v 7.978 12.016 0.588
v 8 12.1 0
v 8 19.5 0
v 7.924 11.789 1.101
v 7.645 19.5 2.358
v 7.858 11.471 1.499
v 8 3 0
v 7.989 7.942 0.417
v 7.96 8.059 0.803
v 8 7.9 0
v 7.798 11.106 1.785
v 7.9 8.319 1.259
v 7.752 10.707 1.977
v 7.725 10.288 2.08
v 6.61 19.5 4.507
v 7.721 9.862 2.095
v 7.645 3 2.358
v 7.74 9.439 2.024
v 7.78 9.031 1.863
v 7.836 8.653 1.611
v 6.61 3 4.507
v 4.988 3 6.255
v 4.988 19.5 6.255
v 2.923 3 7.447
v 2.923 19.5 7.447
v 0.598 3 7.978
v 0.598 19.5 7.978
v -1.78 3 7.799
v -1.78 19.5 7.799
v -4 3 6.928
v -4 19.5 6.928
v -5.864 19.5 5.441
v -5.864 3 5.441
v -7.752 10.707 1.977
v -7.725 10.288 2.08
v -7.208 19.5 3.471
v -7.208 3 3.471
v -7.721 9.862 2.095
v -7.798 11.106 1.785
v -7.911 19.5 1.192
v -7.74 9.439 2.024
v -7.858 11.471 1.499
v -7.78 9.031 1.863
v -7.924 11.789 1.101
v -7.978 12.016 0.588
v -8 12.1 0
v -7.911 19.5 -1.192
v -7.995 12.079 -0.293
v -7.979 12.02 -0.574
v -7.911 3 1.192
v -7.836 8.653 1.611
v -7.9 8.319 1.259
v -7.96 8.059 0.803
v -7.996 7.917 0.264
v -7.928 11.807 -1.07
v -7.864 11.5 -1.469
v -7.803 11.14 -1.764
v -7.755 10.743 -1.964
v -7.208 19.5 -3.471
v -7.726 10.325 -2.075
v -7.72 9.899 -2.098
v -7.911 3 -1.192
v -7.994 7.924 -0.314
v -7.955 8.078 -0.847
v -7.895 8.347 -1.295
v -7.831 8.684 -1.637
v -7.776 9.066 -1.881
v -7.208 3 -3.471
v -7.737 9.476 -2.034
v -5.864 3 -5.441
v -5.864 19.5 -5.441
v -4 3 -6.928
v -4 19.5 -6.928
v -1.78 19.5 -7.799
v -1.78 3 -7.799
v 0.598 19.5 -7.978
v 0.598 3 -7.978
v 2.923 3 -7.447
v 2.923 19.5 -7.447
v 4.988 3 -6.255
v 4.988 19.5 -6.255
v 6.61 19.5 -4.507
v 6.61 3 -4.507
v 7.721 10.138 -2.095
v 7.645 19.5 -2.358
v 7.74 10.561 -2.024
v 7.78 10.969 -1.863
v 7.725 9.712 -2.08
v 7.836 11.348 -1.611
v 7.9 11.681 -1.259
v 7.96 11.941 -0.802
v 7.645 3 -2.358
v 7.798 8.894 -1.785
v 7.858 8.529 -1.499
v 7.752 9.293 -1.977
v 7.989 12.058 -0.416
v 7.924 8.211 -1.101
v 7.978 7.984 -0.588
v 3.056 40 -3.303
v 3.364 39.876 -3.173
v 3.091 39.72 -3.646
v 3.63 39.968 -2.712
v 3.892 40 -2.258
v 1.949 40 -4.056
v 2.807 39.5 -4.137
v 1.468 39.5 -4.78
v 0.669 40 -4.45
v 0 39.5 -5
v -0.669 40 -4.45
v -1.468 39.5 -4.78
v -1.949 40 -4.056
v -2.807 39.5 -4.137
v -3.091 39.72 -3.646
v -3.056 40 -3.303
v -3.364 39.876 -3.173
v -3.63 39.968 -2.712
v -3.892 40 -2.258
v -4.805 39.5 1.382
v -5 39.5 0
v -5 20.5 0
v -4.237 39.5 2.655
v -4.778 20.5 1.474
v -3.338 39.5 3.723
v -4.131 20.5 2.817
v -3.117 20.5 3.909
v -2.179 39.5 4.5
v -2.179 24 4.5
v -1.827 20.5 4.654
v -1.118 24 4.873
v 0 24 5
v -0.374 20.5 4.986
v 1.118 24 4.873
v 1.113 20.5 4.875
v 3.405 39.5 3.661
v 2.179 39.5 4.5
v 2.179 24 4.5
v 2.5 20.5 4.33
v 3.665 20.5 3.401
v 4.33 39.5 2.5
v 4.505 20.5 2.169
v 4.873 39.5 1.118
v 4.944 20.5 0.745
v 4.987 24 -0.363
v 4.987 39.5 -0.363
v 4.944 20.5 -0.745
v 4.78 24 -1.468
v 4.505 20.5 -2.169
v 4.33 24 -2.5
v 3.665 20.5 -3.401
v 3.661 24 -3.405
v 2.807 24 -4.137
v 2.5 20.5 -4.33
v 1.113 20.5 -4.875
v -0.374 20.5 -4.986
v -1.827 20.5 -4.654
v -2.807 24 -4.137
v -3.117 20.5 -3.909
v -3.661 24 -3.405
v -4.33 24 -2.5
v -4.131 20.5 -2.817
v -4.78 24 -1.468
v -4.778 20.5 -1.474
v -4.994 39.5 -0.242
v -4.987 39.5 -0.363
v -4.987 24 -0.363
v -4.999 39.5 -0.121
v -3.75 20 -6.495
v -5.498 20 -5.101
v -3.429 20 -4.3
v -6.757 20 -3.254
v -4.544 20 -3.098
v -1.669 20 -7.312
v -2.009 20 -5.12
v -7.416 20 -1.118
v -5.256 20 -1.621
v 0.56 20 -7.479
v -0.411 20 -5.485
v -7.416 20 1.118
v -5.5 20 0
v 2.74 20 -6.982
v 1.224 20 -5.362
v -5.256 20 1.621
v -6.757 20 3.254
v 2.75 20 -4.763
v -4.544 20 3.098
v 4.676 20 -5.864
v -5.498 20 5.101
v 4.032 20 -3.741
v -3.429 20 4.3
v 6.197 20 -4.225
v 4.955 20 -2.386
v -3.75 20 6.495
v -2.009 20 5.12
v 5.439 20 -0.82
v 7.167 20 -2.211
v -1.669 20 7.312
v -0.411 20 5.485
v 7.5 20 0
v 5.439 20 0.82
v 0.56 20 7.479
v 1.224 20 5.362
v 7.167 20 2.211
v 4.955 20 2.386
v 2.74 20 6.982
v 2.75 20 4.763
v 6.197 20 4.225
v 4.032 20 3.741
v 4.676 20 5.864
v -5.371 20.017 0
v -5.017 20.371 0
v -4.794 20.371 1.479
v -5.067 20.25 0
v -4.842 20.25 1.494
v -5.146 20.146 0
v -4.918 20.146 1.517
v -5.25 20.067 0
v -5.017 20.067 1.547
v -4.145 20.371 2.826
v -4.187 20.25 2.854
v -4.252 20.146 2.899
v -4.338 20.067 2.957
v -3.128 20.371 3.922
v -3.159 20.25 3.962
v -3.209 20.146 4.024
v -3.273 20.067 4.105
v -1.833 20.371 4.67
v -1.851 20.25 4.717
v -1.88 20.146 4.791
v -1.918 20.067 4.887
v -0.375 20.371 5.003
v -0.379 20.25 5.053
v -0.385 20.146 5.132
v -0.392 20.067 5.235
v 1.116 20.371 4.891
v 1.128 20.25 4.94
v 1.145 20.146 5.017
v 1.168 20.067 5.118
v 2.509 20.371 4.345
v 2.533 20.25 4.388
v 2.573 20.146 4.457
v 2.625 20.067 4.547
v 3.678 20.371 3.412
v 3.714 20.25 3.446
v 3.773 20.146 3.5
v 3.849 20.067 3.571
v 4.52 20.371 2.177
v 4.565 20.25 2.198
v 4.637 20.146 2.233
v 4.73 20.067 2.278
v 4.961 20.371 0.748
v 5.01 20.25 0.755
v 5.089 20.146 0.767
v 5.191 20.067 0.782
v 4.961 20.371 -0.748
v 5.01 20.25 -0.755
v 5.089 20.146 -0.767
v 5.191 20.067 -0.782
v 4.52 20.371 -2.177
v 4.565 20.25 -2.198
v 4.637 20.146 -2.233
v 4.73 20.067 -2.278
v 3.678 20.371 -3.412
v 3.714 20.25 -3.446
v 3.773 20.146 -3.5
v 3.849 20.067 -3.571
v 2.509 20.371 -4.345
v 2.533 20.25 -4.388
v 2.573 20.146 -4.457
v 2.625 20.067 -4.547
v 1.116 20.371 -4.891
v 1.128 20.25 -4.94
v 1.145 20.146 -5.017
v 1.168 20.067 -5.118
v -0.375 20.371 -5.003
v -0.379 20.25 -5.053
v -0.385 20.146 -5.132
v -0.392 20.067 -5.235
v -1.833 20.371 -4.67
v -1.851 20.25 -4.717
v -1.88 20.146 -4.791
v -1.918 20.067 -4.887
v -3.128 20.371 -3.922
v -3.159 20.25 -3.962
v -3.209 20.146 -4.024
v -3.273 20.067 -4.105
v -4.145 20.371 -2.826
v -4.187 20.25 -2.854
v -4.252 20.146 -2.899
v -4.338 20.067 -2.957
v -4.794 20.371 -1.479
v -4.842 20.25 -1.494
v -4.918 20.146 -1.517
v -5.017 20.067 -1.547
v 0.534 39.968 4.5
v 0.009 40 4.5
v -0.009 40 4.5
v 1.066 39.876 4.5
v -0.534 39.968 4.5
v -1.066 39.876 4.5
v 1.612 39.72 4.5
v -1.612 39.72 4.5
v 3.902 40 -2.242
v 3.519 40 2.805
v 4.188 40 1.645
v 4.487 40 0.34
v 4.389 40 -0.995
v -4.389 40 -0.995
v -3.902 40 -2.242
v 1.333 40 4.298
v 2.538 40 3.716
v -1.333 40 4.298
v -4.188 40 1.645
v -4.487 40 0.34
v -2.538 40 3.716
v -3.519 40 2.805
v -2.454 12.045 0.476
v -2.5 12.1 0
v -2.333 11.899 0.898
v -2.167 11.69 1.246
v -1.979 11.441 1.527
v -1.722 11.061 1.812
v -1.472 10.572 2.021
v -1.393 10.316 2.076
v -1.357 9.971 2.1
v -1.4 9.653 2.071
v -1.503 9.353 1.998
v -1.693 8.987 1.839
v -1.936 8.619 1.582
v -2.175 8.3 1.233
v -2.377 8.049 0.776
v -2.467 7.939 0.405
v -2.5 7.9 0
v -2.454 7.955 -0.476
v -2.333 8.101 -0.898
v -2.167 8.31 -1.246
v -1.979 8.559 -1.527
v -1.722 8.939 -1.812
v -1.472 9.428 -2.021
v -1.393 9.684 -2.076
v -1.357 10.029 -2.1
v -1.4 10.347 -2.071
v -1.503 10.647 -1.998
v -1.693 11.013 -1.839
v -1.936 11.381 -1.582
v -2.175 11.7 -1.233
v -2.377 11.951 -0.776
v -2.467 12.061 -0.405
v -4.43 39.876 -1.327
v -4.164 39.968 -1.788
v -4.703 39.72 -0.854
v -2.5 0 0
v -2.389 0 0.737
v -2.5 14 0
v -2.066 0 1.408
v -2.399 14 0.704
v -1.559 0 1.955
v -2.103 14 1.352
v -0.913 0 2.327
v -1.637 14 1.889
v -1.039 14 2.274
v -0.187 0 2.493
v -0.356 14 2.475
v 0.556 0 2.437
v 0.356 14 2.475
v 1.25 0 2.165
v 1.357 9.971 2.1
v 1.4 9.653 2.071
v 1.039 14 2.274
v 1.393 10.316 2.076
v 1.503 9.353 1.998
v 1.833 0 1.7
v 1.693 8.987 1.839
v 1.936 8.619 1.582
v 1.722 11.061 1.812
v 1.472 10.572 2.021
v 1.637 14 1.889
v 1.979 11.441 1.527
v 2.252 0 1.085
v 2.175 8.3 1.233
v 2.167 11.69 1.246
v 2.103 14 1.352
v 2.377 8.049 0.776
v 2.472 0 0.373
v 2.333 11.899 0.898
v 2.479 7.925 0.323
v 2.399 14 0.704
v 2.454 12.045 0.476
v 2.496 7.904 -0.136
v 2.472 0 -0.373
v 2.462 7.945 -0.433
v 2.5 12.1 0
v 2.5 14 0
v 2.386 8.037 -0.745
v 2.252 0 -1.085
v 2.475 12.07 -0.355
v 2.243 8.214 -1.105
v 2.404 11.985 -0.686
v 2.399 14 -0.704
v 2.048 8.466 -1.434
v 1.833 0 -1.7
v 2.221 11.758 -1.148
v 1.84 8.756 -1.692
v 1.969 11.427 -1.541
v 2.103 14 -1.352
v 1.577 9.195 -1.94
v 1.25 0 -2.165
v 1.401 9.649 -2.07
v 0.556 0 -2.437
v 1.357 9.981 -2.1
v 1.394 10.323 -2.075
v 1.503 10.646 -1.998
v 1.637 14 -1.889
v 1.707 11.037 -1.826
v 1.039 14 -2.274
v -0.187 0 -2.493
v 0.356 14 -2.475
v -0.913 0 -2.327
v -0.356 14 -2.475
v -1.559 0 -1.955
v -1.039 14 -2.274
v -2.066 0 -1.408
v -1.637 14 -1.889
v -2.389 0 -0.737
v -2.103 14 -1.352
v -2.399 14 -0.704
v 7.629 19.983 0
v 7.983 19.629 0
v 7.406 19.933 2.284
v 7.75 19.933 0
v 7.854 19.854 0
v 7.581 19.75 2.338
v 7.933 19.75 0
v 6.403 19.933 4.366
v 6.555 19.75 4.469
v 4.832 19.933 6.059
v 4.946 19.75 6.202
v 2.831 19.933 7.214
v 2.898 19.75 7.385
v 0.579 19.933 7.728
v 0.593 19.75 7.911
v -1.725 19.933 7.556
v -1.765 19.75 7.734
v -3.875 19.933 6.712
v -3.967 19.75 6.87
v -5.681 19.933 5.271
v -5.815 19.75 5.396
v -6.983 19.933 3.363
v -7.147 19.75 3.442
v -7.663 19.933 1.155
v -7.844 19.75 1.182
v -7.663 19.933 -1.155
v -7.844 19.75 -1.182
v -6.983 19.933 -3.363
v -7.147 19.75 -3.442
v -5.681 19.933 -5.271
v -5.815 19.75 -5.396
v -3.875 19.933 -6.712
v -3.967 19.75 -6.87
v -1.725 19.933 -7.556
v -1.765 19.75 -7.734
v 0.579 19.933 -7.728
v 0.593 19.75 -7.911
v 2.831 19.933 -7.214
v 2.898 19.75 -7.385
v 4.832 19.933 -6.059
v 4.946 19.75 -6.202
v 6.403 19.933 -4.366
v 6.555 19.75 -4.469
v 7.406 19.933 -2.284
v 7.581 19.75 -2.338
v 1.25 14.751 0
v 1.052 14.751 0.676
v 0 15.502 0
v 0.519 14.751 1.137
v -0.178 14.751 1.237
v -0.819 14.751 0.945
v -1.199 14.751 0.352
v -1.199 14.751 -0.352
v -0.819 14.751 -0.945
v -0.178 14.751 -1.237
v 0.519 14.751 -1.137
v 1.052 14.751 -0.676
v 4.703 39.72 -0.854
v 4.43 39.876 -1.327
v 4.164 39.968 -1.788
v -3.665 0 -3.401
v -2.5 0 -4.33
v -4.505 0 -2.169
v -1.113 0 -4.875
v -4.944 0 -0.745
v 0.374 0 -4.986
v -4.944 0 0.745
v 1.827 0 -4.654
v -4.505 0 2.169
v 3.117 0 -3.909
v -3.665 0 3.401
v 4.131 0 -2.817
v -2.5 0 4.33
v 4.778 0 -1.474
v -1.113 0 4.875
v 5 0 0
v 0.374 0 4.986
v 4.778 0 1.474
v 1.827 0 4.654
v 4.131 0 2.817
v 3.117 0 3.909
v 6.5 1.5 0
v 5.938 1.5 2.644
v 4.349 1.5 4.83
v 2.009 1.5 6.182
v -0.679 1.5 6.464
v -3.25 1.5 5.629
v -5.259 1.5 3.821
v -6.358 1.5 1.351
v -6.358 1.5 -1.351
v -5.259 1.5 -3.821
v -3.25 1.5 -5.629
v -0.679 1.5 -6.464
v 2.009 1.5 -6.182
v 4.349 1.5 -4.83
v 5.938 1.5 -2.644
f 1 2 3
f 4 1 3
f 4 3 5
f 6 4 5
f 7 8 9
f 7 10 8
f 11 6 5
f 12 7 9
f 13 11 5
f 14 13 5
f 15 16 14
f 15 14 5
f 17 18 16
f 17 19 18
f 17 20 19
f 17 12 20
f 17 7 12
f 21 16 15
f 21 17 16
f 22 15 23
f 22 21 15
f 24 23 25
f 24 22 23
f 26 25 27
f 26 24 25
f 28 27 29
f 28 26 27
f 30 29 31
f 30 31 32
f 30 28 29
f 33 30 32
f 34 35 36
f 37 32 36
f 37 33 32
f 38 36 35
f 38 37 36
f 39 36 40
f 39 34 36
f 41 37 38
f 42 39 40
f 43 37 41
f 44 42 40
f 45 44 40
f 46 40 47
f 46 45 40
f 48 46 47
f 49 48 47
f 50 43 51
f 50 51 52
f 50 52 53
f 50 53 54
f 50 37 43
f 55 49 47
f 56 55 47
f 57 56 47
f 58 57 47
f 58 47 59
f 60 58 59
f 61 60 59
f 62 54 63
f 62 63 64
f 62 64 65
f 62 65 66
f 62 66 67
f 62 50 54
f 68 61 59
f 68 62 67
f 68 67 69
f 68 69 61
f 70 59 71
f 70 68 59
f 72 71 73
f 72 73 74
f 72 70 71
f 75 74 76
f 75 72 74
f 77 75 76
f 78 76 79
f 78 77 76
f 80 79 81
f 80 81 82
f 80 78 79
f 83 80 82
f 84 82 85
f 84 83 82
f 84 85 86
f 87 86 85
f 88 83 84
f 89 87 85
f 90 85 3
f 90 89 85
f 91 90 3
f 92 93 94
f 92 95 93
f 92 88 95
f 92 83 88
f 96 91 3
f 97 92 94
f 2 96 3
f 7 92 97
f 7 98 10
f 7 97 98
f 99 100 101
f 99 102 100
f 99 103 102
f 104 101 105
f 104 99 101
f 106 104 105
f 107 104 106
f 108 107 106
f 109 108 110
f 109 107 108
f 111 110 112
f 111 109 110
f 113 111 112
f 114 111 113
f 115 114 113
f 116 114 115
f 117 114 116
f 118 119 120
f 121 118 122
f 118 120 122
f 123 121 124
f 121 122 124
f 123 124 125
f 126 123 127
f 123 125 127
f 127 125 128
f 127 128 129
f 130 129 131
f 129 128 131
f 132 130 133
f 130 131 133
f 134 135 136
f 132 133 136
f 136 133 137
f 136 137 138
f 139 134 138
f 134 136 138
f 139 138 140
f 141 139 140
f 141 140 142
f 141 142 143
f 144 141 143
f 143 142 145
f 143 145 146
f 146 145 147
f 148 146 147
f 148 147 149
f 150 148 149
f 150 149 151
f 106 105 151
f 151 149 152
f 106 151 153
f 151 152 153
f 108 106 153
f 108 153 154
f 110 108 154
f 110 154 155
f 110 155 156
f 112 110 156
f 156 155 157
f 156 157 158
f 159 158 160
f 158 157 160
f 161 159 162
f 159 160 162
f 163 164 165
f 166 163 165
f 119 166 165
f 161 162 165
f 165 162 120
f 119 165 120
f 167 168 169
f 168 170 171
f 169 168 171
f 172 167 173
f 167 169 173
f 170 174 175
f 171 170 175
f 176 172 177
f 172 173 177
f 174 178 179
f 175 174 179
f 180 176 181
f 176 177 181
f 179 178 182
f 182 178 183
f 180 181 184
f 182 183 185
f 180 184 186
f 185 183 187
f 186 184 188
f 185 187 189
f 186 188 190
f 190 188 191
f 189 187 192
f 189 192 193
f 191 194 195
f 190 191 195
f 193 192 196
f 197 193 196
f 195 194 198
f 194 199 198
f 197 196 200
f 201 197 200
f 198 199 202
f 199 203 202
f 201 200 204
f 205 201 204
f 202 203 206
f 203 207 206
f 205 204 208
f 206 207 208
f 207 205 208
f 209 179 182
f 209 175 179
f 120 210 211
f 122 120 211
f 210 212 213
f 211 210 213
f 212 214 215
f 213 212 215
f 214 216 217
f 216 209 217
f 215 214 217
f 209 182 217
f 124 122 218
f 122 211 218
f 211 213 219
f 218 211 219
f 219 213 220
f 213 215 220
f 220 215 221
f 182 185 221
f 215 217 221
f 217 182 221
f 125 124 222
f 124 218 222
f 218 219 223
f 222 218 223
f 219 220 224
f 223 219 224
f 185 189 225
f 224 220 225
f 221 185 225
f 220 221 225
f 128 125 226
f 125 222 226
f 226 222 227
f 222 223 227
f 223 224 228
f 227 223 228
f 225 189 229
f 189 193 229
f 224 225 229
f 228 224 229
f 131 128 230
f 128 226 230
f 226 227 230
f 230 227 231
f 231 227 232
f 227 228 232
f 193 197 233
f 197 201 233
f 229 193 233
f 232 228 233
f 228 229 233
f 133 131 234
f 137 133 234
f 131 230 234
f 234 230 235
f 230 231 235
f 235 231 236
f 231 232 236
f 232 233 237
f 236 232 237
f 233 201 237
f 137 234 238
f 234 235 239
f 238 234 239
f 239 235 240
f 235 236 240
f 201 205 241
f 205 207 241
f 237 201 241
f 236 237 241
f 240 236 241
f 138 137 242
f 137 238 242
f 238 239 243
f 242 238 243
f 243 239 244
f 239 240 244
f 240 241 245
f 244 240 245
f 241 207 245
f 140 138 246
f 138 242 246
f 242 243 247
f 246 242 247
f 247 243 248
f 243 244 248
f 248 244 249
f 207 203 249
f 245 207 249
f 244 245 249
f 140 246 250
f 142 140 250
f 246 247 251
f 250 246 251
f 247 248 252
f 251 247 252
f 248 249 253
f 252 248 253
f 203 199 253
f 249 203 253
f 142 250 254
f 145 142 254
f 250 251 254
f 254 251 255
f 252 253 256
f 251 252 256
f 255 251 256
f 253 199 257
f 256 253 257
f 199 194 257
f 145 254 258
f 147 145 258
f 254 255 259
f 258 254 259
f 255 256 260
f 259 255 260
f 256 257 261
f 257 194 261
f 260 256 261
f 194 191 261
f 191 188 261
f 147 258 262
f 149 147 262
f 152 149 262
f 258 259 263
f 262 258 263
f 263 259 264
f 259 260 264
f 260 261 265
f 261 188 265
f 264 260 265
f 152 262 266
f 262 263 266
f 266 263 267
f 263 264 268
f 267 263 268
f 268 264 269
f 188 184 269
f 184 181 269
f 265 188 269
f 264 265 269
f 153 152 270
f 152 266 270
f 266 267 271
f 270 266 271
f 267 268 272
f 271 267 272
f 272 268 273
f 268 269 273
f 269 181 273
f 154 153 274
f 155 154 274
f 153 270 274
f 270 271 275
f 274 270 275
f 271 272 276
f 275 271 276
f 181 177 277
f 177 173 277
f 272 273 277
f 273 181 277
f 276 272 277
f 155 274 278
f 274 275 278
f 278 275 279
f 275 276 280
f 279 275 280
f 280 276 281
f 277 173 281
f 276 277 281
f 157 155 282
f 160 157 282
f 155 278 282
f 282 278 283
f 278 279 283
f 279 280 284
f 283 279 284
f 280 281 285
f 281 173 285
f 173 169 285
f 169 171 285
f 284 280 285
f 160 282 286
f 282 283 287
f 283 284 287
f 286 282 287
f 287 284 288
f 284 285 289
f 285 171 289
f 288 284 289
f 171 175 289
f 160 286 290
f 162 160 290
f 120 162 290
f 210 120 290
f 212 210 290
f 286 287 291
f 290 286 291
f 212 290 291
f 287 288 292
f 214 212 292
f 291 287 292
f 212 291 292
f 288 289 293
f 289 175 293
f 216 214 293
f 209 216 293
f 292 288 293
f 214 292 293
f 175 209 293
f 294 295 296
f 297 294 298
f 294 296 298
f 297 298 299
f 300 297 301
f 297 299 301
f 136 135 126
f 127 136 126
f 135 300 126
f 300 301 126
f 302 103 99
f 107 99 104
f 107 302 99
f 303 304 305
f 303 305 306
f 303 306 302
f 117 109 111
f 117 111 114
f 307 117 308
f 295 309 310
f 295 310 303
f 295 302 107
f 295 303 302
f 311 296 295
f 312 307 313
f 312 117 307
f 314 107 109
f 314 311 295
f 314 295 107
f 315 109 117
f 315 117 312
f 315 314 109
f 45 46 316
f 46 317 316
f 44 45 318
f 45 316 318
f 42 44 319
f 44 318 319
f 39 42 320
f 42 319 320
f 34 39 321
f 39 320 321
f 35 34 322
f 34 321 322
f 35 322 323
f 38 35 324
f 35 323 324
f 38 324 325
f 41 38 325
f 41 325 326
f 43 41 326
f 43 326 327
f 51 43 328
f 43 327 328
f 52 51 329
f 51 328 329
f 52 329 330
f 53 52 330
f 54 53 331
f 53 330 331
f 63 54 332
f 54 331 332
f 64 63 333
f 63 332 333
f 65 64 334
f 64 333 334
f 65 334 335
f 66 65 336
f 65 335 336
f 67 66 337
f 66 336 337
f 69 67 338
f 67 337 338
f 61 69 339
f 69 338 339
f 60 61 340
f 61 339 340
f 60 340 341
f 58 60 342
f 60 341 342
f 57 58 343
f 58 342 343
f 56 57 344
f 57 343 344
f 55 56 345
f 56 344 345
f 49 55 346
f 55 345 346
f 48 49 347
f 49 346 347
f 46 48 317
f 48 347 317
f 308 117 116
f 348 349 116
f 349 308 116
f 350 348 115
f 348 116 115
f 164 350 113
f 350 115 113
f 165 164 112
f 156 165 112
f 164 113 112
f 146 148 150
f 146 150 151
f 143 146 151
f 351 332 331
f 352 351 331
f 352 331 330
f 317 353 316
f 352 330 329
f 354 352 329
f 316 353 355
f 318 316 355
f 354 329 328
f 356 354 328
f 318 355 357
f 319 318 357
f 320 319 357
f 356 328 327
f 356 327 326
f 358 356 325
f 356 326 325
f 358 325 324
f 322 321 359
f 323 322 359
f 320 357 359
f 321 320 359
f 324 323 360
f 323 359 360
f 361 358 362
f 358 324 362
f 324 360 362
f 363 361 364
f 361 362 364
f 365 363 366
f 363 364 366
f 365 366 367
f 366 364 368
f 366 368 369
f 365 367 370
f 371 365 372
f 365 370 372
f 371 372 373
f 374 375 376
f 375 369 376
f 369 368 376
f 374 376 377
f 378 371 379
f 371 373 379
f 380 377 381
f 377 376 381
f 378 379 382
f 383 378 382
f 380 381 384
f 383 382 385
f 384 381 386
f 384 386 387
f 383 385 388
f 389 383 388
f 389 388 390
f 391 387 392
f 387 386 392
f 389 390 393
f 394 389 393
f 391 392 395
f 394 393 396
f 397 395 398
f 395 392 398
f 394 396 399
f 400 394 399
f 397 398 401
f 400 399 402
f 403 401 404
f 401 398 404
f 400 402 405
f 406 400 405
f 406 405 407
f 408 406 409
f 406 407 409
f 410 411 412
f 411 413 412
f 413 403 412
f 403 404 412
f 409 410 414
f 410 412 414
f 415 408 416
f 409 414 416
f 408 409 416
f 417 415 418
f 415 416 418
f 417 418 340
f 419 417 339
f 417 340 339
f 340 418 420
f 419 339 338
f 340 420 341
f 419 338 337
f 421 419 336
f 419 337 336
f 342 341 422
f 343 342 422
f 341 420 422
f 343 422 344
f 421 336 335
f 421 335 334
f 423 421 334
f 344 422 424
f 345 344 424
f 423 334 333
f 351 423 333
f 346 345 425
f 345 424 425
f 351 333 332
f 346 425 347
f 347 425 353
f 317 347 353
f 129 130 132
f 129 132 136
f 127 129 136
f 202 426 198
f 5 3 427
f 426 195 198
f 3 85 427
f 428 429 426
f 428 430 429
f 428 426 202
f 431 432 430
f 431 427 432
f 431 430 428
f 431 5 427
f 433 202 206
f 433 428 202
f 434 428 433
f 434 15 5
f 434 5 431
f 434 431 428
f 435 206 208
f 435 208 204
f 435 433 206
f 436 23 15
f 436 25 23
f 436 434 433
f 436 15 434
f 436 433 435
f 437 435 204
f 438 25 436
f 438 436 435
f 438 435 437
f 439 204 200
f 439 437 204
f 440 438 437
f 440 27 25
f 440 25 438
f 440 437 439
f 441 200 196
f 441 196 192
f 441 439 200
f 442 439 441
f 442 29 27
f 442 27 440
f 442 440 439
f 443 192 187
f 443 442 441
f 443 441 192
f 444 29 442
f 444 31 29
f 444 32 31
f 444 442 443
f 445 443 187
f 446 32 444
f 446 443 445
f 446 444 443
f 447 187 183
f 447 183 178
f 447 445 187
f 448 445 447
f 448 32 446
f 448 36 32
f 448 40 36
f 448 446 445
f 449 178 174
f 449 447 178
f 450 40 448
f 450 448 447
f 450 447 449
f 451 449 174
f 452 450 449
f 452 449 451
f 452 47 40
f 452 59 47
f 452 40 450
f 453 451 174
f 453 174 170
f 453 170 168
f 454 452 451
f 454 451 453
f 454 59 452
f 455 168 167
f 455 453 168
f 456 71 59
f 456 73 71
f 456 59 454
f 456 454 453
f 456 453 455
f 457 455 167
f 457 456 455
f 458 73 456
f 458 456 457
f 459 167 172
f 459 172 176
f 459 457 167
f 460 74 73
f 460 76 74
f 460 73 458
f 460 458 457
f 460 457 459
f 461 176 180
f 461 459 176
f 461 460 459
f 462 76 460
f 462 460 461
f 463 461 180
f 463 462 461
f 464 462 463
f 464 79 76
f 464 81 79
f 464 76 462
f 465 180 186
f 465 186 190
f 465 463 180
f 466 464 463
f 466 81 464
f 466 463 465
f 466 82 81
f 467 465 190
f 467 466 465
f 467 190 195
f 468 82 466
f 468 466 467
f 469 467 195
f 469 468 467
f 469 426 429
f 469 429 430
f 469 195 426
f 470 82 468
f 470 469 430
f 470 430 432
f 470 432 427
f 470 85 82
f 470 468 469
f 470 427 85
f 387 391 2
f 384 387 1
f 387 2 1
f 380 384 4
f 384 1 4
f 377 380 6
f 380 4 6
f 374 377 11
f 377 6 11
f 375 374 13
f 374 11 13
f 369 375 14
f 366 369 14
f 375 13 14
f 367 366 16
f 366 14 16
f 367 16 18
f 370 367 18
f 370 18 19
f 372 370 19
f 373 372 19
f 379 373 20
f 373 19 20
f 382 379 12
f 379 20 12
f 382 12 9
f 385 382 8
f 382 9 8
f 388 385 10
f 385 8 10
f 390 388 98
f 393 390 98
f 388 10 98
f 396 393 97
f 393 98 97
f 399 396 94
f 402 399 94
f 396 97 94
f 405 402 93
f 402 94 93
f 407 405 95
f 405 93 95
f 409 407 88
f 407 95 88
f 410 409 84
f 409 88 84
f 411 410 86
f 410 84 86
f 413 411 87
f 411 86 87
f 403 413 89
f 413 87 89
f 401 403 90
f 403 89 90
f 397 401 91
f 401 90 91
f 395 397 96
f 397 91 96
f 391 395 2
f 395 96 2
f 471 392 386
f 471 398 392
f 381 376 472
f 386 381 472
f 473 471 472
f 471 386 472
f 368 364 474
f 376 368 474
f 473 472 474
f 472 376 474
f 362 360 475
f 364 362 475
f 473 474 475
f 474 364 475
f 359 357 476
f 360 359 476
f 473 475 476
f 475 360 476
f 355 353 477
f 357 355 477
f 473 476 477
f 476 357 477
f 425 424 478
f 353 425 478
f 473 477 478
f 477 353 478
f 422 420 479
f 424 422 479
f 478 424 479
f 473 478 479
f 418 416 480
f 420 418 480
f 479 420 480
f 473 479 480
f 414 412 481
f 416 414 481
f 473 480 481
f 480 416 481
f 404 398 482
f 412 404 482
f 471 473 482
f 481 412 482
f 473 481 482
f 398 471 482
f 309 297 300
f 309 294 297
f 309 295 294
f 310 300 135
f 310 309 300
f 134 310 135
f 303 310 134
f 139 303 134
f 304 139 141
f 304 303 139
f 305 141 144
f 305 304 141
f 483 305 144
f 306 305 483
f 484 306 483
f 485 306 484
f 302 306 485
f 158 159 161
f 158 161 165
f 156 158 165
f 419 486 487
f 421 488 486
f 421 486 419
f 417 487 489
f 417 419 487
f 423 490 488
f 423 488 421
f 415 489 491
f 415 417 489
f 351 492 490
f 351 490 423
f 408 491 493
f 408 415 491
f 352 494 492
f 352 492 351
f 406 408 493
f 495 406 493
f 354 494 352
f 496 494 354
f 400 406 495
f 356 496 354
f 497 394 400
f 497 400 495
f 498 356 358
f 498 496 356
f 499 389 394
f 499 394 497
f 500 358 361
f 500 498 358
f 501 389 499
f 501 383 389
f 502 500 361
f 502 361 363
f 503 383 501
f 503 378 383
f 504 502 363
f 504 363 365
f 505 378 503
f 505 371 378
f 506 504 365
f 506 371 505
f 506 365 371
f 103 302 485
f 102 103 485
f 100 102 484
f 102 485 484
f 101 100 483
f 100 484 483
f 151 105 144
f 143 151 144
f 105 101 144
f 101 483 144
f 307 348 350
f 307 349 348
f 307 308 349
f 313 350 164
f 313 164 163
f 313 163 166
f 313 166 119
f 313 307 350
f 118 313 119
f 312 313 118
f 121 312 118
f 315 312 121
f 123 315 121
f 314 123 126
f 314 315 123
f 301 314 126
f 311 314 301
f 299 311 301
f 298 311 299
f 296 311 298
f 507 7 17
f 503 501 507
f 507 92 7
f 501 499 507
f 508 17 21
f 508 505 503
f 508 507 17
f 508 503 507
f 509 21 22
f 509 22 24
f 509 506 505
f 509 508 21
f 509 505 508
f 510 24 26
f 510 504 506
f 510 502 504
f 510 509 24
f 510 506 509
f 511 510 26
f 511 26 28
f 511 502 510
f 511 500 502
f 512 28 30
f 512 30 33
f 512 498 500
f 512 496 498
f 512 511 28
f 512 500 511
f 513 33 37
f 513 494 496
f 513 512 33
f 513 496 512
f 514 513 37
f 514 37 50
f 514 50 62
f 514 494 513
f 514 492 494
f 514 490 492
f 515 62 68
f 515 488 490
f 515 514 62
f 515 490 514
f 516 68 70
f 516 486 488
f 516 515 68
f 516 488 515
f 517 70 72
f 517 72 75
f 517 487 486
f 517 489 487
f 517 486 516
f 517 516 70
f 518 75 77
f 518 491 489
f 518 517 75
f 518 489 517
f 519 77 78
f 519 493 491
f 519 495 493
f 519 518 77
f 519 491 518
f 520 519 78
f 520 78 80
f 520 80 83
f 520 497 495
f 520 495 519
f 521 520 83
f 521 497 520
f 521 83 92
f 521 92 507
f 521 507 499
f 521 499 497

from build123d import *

# Parameters (mm, degrees)
F0_R            = 8
F1_DEPTH        = 20
F2_R            = 5
F3_DEPTH        = 20
F5_DEPTH        = 16
F5_COPIES_COUNT = 3
F6_SIZE         = 0.49999
F7_R            = 0.5
F9_D            = 5
F9_DEPTH        = 14
F9_TIP          = 1.5021515476
F10_R           = 2.1
F11_DEPTH       = 8.25
F12_SIZE        = 3


# Not quite as in the source:
# - a fillet or chamfer is up to 0.001 mm smaller than in the source, because OpenCascade refuses the exact size
# - a pattern or mirror of a feature is missing from the dataset's text; its kind, count and spacing are read off the source's solid


with BuildPart() as f1:
    # F0 (on Front) → F1 (new body)
    with BuildSketch(Plane.XZ):
        Circle(F0_R)
    extrude(amount=-F1_DEPTH)

    # F2 (on face) → F3 (join)
    with BuildSketch(Plane(origin=(0, 20, 0), x_dir=(-1, 0, 0), z_dir=(0, 1, 0))):
        Circle(F2_R)
    extrude(amount=F3_DEPTH)

    # F4 (on face) → F5 (cut)
    with BuildSketch(Plane(origin=(0, 40, 0), x_dir=(-1, 0, 0), z_dir=(0, 1, 0))):
        with BuildLine():
            ThreePointArc((2.1794494718, 4.5), (0, 5), (-2.1794494718, 4.5))
            Line((-2.1794494718, 4.5), (2.1794494718, 4.5))
        make_face()
    f5 = extrude(amount=-F5_DEPTH, mode=Mode.SUBTRACT)

    # F5_copies: F5 ×3 about axis
    f5_copies_axis = Axis((0, 0, 0), (0, 1, 0))
    for i in range(1, F5_COPIES_COUNT):
        add(f5.rotate(f5_copies_axis, i * 360 / F5_COPIES_COUNT), mode=Mode.SUBTRACT)

    # F6 (size 0.5 in the source; OpenCascade refuses exactly that, so slightly less here)
    f6_edges = [f1.edges().sort_by_distance(p)[0] for p in [
        (4.330127, 40, 2.5),
        (-4.996709, 40, -0.18139),
        (0, 40, -5),
        (-4.236582, 40, 2.655443),
    ]]
    chamfer(f6_edges, length=F6_SIZE)

    # F7
    f7_edges = [f1.edges().sort_by_distance(p)[0] for p in [
        (-8, 20, 0),
        (5, 20, 0),
    ]]
    fillet(f7_edges, radius=F7_R)

    # F9
    with Locations(Plane.XZ):
        with Locations((0, 0)):
            Hole(F9_D / 2, depth=F9_DEPTH)
            with Locations((0, 0, -(F9_DEPTH + F9_TIP / 2))):  # 118° drill point
                Cone(0, F9_D / 2, F9_TIP, mode=Mode.SUBTRACT)

    # F10 (on Right) → F11 (cut, symmetric)
    with BuildSketch(Plane.YZ):
        with Locations((10, 0)):
            Circle(F10_R)
    extrude(amount=F11_DEPTH, both=True, mode=Mode.SUBTRACT)

    # F12
    f12_edges = [f1.edges().sort_by_distance(p)[0] for p in [
        (-8, 0, 0),
    ]]
    chamfer(f12_edges, length=F12_SIZE)


solid = f1.part
